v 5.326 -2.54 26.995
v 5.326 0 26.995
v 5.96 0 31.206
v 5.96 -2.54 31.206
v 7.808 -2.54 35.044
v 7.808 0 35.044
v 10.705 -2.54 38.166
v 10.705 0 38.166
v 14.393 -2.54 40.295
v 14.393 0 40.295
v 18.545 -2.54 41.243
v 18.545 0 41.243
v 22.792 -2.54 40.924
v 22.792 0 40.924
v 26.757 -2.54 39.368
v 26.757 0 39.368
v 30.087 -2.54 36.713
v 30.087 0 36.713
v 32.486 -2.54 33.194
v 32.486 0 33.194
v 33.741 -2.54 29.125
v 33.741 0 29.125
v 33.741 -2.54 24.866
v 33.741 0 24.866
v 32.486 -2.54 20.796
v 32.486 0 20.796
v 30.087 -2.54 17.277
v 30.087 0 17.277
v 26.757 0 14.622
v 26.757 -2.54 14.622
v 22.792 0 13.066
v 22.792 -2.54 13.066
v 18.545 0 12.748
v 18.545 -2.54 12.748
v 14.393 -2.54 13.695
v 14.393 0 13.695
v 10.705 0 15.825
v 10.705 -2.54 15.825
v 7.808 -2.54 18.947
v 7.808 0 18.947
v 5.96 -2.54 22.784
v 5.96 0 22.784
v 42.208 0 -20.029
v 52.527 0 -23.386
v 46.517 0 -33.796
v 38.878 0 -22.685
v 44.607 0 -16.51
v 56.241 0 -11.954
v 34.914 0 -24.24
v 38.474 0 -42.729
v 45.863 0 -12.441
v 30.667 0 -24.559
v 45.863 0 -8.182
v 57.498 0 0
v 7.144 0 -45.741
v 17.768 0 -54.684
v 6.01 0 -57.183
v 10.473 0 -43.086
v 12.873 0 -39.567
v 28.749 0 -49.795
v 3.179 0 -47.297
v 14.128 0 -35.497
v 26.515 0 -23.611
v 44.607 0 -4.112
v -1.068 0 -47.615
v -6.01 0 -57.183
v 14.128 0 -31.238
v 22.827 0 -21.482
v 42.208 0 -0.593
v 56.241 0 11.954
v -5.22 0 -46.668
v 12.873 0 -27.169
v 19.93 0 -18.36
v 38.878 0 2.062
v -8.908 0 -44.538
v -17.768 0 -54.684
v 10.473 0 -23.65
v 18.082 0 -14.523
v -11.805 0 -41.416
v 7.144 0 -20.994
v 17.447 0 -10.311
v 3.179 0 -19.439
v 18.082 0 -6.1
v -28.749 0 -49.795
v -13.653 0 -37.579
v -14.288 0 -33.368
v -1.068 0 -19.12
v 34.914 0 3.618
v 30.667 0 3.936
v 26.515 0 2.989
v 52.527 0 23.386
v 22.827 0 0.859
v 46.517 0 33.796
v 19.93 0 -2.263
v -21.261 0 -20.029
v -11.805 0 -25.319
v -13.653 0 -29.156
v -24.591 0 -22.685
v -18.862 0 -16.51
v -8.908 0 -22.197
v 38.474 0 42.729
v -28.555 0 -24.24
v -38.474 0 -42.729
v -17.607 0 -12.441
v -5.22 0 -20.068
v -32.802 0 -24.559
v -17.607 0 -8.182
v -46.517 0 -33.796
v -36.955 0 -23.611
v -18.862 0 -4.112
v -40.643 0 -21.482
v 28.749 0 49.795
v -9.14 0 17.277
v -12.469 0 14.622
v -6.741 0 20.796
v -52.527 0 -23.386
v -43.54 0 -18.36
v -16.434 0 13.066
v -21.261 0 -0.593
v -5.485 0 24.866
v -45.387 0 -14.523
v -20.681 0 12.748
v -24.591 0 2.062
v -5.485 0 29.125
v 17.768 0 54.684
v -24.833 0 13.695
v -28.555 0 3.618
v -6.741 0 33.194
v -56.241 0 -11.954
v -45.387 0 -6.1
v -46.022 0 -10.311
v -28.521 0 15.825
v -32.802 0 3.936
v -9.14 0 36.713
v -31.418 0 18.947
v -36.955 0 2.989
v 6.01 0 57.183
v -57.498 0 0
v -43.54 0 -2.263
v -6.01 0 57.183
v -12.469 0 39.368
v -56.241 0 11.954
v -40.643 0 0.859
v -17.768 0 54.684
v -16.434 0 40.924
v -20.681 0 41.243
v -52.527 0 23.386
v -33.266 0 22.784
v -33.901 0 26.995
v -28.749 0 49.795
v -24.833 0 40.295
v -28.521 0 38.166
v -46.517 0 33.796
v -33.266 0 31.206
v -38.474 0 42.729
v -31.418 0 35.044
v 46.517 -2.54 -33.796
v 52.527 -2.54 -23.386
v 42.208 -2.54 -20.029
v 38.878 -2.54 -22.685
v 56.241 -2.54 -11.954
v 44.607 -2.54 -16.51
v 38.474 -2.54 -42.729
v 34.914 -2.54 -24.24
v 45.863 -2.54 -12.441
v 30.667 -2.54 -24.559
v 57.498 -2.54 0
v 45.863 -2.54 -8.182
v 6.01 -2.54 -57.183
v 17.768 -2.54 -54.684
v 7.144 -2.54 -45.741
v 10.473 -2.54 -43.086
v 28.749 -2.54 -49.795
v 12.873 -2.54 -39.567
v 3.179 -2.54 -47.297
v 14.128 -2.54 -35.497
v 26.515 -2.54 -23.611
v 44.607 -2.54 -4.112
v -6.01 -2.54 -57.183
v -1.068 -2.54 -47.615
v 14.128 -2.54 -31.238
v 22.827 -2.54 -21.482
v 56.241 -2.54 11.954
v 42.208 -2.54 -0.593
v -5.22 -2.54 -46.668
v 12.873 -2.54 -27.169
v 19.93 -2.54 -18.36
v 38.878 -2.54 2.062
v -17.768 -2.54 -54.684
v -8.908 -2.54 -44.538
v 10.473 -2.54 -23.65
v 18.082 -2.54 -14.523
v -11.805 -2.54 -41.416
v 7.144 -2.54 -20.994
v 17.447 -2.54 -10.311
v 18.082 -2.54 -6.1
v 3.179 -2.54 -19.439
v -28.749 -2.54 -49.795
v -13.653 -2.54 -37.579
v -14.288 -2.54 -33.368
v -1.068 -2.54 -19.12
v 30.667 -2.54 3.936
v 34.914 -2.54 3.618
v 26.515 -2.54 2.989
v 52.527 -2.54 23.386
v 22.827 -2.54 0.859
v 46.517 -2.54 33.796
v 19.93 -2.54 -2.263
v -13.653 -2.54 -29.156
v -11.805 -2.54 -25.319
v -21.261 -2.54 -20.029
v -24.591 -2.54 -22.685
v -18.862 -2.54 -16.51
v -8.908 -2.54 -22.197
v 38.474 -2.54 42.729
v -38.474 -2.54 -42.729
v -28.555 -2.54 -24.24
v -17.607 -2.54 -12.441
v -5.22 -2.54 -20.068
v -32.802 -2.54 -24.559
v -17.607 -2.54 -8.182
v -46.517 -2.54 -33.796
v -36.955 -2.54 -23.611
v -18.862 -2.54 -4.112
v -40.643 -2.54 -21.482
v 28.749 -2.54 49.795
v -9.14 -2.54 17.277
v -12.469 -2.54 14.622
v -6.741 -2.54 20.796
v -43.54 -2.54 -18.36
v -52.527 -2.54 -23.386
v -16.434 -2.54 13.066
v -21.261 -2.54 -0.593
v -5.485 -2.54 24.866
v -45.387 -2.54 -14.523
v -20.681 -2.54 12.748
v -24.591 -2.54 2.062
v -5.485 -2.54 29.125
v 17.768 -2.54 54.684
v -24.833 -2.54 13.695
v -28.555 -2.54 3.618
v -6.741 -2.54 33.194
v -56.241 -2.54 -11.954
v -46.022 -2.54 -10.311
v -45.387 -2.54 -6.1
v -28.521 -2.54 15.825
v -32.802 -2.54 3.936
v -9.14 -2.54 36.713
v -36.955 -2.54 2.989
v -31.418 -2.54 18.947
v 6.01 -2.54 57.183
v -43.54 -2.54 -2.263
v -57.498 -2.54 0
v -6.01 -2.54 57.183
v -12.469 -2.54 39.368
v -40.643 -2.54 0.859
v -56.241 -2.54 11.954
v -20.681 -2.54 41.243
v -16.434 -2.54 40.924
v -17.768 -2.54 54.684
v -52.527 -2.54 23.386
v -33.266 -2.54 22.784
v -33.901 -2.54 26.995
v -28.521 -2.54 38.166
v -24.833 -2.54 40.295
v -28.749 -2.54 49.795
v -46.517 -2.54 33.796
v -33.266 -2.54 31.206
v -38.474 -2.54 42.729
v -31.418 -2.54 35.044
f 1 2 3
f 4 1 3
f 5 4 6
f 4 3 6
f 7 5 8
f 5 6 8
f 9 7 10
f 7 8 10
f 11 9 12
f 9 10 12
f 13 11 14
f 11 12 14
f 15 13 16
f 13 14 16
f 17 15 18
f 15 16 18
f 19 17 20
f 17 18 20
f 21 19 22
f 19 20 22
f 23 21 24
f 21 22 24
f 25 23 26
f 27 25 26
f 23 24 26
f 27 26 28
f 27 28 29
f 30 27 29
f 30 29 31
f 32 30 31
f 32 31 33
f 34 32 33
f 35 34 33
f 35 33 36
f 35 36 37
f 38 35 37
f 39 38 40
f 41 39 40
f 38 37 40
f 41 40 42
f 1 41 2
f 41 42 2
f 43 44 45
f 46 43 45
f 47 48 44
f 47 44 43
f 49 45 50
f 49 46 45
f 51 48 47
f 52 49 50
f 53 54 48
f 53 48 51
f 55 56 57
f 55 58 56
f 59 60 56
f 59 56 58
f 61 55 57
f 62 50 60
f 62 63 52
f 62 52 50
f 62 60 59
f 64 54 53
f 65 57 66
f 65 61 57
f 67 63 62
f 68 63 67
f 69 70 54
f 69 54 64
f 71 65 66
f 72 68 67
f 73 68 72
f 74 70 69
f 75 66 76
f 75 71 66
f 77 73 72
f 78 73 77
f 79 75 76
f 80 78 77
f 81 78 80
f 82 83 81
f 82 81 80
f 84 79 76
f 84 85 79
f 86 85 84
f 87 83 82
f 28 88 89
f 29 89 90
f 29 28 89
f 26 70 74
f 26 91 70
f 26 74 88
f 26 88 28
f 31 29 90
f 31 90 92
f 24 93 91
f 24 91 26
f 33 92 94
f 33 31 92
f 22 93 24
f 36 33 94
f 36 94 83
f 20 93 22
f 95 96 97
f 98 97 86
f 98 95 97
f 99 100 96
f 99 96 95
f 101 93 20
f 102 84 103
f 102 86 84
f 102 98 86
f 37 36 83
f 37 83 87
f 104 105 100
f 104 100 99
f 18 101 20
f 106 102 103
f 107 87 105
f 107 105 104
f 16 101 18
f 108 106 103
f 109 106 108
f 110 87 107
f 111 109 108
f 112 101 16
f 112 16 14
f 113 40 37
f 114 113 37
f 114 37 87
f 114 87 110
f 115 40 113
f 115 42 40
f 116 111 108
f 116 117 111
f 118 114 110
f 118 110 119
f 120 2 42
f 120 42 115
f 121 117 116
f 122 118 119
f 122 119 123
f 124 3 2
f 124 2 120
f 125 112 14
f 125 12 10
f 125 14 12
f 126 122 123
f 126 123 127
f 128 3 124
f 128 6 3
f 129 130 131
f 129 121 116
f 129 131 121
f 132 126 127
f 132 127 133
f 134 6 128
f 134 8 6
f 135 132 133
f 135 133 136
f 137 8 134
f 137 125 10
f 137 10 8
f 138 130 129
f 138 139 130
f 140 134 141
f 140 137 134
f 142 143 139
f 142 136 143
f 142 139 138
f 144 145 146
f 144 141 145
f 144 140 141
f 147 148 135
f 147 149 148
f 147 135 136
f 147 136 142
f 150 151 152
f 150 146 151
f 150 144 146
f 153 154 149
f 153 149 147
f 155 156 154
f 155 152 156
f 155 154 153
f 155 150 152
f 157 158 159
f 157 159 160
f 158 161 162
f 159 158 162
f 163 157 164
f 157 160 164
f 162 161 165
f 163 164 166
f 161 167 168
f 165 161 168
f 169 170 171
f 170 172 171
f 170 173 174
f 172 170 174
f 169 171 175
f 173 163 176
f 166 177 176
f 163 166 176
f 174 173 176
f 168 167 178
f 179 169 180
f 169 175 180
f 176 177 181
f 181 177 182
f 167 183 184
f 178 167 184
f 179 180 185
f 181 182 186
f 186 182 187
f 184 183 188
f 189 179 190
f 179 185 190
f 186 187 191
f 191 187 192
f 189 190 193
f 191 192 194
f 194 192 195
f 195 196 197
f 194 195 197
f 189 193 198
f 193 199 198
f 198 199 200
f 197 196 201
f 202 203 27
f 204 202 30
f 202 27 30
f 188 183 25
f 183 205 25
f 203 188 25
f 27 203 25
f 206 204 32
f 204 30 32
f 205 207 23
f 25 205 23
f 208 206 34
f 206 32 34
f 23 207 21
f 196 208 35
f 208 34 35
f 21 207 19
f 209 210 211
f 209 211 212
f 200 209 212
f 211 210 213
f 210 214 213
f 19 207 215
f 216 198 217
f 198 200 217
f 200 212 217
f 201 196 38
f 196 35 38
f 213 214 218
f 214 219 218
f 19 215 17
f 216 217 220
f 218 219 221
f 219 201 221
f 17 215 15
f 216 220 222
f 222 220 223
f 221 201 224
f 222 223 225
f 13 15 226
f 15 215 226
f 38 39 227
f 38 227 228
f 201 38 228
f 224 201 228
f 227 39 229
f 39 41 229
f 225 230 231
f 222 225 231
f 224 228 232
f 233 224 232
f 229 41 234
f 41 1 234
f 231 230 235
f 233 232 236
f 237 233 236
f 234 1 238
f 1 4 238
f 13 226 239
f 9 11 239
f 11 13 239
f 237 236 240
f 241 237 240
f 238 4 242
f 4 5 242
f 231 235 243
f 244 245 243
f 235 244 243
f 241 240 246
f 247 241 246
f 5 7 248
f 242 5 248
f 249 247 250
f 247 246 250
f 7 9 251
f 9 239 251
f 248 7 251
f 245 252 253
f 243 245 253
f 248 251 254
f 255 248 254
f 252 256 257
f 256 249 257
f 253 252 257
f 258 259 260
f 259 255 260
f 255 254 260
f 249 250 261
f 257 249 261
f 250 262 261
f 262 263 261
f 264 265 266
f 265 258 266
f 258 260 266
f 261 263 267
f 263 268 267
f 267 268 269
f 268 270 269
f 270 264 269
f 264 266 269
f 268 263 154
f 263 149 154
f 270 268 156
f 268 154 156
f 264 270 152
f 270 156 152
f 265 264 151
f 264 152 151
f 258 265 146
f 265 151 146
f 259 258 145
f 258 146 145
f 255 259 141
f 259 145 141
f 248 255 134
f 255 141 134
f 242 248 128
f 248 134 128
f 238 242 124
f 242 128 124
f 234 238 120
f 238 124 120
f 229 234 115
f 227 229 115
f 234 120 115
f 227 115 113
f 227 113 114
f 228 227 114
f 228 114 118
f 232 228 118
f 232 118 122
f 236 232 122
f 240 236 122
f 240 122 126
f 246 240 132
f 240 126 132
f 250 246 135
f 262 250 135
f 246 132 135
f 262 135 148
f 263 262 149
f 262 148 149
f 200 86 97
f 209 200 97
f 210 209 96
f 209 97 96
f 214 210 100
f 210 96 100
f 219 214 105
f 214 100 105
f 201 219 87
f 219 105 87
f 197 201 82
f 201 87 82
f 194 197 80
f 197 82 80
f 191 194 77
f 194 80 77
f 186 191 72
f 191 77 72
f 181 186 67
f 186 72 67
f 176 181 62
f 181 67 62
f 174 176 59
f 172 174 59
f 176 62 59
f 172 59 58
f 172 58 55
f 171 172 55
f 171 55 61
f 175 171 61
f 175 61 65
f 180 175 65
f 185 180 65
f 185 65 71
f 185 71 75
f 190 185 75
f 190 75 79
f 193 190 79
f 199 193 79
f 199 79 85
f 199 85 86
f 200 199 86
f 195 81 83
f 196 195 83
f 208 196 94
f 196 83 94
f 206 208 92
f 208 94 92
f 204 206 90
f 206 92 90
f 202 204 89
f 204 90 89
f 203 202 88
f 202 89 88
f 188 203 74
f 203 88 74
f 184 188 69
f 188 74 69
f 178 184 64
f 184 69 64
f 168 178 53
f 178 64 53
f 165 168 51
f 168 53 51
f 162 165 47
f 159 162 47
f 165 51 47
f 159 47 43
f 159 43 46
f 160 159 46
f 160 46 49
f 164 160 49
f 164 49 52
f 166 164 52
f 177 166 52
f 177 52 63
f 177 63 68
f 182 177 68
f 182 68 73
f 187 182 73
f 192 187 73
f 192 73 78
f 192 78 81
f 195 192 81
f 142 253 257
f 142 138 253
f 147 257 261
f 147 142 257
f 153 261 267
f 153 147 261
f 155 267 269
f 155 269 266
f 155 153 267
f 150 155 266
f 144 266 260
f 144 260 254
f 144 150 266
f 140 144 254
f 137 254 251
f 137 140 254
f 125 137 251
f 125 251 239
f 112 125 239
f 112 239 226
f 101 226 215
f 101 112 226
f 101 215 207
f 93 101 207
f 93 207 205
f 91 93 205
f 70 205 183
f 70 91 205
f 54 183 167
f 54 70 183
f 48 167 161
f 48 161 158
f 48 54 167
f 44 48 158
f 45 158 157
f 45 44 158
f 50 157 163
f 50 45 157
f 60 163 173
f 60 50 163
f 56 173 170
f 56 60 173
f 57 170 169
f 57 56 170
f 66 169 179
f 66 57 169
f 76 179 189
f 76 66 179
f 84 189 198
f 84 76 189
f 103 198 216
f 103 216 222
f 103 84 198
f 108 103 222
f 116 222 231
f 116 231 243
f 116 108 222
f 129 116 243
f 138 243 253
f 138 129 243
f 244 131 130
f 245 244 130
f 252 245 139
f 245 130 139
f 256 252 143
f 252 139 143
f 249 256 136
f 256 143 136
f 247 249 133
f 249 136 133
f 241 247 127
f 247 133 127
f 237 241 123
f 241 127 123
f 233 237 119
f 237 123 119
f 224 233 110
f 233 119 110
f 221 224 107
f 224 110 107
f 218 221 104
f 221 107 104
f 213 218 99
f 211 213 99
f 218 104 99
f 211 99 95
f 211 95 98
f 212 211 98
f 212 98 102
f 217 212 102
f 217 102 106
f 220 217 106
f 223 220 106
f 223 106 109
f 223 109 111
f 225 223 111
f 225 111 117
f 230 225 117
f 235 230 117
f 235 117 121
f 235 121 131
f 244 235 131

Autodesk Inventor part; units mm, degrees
ref_plane "YZ Plane" through (0, 0, 0) normal (1, 0, 0) x (0, 1, 0)
ref_plane "XZ Plane" through (0, 0, 0) normal (0, 1, 0) x (-1, 0, 0)
ref_plane "XY Plane" through (0, 0, 0) normal (0, 0, 1) x (1, 0, 0)
sketch "Sketch1" plane through (0, 0, 0) normal (0, 1, 0) x (-1, 0, 0)
  circle A0 centre (0, 0) radius 57.4978
  circle A1 centre (0, 0) radius 33.3678 construction
  circle A2 centre (0, -33.3678) radius 14.2875
  circle A3 centre (31.7347, -10.3112) radius 14.2875
  circle A4 centre (19.6131, 26.9951) radius 14.2875
  circle A5 centre (-19.6131, 26.9951) radius 14.2875
  circle A6 centre (-31.7347, -10.3112) radius 14.2875
  dimension "wheelFilterDiameter" = 66.7357
  dimension "wheelOuterDiameter" = 114.9957
  dimension "filterThreadDiameter" = 28.575
  dimension "d5" = 360
extrude "Extrusion1" add sketch "Sketch1" against normal blind 2.54
thread "Thread1" size "1 1/8-42 UN-RES" designation "1 1/8-28 UN-RDS" class "3B" standard "ANSI Unified Screw Threads" full length
equation "\"wheelFilterDiameter\" = 0.318471 * wheelFilterCircumference"
equation "\"wheelOuterDiameter\" = filterDiameter + wheelFilterDiameter + 2 * distanceFromFilterToEdge"
equation "\"distanceBetweenFilters\" = 12.7"
equation "\"distanceFromFilterToEdge\" = 9.525"
equation "\"filterDiameter\" = 29.21"
equation "\"wheelFilterCircumference\" = 209.55"
properties part number "filterHolder"
